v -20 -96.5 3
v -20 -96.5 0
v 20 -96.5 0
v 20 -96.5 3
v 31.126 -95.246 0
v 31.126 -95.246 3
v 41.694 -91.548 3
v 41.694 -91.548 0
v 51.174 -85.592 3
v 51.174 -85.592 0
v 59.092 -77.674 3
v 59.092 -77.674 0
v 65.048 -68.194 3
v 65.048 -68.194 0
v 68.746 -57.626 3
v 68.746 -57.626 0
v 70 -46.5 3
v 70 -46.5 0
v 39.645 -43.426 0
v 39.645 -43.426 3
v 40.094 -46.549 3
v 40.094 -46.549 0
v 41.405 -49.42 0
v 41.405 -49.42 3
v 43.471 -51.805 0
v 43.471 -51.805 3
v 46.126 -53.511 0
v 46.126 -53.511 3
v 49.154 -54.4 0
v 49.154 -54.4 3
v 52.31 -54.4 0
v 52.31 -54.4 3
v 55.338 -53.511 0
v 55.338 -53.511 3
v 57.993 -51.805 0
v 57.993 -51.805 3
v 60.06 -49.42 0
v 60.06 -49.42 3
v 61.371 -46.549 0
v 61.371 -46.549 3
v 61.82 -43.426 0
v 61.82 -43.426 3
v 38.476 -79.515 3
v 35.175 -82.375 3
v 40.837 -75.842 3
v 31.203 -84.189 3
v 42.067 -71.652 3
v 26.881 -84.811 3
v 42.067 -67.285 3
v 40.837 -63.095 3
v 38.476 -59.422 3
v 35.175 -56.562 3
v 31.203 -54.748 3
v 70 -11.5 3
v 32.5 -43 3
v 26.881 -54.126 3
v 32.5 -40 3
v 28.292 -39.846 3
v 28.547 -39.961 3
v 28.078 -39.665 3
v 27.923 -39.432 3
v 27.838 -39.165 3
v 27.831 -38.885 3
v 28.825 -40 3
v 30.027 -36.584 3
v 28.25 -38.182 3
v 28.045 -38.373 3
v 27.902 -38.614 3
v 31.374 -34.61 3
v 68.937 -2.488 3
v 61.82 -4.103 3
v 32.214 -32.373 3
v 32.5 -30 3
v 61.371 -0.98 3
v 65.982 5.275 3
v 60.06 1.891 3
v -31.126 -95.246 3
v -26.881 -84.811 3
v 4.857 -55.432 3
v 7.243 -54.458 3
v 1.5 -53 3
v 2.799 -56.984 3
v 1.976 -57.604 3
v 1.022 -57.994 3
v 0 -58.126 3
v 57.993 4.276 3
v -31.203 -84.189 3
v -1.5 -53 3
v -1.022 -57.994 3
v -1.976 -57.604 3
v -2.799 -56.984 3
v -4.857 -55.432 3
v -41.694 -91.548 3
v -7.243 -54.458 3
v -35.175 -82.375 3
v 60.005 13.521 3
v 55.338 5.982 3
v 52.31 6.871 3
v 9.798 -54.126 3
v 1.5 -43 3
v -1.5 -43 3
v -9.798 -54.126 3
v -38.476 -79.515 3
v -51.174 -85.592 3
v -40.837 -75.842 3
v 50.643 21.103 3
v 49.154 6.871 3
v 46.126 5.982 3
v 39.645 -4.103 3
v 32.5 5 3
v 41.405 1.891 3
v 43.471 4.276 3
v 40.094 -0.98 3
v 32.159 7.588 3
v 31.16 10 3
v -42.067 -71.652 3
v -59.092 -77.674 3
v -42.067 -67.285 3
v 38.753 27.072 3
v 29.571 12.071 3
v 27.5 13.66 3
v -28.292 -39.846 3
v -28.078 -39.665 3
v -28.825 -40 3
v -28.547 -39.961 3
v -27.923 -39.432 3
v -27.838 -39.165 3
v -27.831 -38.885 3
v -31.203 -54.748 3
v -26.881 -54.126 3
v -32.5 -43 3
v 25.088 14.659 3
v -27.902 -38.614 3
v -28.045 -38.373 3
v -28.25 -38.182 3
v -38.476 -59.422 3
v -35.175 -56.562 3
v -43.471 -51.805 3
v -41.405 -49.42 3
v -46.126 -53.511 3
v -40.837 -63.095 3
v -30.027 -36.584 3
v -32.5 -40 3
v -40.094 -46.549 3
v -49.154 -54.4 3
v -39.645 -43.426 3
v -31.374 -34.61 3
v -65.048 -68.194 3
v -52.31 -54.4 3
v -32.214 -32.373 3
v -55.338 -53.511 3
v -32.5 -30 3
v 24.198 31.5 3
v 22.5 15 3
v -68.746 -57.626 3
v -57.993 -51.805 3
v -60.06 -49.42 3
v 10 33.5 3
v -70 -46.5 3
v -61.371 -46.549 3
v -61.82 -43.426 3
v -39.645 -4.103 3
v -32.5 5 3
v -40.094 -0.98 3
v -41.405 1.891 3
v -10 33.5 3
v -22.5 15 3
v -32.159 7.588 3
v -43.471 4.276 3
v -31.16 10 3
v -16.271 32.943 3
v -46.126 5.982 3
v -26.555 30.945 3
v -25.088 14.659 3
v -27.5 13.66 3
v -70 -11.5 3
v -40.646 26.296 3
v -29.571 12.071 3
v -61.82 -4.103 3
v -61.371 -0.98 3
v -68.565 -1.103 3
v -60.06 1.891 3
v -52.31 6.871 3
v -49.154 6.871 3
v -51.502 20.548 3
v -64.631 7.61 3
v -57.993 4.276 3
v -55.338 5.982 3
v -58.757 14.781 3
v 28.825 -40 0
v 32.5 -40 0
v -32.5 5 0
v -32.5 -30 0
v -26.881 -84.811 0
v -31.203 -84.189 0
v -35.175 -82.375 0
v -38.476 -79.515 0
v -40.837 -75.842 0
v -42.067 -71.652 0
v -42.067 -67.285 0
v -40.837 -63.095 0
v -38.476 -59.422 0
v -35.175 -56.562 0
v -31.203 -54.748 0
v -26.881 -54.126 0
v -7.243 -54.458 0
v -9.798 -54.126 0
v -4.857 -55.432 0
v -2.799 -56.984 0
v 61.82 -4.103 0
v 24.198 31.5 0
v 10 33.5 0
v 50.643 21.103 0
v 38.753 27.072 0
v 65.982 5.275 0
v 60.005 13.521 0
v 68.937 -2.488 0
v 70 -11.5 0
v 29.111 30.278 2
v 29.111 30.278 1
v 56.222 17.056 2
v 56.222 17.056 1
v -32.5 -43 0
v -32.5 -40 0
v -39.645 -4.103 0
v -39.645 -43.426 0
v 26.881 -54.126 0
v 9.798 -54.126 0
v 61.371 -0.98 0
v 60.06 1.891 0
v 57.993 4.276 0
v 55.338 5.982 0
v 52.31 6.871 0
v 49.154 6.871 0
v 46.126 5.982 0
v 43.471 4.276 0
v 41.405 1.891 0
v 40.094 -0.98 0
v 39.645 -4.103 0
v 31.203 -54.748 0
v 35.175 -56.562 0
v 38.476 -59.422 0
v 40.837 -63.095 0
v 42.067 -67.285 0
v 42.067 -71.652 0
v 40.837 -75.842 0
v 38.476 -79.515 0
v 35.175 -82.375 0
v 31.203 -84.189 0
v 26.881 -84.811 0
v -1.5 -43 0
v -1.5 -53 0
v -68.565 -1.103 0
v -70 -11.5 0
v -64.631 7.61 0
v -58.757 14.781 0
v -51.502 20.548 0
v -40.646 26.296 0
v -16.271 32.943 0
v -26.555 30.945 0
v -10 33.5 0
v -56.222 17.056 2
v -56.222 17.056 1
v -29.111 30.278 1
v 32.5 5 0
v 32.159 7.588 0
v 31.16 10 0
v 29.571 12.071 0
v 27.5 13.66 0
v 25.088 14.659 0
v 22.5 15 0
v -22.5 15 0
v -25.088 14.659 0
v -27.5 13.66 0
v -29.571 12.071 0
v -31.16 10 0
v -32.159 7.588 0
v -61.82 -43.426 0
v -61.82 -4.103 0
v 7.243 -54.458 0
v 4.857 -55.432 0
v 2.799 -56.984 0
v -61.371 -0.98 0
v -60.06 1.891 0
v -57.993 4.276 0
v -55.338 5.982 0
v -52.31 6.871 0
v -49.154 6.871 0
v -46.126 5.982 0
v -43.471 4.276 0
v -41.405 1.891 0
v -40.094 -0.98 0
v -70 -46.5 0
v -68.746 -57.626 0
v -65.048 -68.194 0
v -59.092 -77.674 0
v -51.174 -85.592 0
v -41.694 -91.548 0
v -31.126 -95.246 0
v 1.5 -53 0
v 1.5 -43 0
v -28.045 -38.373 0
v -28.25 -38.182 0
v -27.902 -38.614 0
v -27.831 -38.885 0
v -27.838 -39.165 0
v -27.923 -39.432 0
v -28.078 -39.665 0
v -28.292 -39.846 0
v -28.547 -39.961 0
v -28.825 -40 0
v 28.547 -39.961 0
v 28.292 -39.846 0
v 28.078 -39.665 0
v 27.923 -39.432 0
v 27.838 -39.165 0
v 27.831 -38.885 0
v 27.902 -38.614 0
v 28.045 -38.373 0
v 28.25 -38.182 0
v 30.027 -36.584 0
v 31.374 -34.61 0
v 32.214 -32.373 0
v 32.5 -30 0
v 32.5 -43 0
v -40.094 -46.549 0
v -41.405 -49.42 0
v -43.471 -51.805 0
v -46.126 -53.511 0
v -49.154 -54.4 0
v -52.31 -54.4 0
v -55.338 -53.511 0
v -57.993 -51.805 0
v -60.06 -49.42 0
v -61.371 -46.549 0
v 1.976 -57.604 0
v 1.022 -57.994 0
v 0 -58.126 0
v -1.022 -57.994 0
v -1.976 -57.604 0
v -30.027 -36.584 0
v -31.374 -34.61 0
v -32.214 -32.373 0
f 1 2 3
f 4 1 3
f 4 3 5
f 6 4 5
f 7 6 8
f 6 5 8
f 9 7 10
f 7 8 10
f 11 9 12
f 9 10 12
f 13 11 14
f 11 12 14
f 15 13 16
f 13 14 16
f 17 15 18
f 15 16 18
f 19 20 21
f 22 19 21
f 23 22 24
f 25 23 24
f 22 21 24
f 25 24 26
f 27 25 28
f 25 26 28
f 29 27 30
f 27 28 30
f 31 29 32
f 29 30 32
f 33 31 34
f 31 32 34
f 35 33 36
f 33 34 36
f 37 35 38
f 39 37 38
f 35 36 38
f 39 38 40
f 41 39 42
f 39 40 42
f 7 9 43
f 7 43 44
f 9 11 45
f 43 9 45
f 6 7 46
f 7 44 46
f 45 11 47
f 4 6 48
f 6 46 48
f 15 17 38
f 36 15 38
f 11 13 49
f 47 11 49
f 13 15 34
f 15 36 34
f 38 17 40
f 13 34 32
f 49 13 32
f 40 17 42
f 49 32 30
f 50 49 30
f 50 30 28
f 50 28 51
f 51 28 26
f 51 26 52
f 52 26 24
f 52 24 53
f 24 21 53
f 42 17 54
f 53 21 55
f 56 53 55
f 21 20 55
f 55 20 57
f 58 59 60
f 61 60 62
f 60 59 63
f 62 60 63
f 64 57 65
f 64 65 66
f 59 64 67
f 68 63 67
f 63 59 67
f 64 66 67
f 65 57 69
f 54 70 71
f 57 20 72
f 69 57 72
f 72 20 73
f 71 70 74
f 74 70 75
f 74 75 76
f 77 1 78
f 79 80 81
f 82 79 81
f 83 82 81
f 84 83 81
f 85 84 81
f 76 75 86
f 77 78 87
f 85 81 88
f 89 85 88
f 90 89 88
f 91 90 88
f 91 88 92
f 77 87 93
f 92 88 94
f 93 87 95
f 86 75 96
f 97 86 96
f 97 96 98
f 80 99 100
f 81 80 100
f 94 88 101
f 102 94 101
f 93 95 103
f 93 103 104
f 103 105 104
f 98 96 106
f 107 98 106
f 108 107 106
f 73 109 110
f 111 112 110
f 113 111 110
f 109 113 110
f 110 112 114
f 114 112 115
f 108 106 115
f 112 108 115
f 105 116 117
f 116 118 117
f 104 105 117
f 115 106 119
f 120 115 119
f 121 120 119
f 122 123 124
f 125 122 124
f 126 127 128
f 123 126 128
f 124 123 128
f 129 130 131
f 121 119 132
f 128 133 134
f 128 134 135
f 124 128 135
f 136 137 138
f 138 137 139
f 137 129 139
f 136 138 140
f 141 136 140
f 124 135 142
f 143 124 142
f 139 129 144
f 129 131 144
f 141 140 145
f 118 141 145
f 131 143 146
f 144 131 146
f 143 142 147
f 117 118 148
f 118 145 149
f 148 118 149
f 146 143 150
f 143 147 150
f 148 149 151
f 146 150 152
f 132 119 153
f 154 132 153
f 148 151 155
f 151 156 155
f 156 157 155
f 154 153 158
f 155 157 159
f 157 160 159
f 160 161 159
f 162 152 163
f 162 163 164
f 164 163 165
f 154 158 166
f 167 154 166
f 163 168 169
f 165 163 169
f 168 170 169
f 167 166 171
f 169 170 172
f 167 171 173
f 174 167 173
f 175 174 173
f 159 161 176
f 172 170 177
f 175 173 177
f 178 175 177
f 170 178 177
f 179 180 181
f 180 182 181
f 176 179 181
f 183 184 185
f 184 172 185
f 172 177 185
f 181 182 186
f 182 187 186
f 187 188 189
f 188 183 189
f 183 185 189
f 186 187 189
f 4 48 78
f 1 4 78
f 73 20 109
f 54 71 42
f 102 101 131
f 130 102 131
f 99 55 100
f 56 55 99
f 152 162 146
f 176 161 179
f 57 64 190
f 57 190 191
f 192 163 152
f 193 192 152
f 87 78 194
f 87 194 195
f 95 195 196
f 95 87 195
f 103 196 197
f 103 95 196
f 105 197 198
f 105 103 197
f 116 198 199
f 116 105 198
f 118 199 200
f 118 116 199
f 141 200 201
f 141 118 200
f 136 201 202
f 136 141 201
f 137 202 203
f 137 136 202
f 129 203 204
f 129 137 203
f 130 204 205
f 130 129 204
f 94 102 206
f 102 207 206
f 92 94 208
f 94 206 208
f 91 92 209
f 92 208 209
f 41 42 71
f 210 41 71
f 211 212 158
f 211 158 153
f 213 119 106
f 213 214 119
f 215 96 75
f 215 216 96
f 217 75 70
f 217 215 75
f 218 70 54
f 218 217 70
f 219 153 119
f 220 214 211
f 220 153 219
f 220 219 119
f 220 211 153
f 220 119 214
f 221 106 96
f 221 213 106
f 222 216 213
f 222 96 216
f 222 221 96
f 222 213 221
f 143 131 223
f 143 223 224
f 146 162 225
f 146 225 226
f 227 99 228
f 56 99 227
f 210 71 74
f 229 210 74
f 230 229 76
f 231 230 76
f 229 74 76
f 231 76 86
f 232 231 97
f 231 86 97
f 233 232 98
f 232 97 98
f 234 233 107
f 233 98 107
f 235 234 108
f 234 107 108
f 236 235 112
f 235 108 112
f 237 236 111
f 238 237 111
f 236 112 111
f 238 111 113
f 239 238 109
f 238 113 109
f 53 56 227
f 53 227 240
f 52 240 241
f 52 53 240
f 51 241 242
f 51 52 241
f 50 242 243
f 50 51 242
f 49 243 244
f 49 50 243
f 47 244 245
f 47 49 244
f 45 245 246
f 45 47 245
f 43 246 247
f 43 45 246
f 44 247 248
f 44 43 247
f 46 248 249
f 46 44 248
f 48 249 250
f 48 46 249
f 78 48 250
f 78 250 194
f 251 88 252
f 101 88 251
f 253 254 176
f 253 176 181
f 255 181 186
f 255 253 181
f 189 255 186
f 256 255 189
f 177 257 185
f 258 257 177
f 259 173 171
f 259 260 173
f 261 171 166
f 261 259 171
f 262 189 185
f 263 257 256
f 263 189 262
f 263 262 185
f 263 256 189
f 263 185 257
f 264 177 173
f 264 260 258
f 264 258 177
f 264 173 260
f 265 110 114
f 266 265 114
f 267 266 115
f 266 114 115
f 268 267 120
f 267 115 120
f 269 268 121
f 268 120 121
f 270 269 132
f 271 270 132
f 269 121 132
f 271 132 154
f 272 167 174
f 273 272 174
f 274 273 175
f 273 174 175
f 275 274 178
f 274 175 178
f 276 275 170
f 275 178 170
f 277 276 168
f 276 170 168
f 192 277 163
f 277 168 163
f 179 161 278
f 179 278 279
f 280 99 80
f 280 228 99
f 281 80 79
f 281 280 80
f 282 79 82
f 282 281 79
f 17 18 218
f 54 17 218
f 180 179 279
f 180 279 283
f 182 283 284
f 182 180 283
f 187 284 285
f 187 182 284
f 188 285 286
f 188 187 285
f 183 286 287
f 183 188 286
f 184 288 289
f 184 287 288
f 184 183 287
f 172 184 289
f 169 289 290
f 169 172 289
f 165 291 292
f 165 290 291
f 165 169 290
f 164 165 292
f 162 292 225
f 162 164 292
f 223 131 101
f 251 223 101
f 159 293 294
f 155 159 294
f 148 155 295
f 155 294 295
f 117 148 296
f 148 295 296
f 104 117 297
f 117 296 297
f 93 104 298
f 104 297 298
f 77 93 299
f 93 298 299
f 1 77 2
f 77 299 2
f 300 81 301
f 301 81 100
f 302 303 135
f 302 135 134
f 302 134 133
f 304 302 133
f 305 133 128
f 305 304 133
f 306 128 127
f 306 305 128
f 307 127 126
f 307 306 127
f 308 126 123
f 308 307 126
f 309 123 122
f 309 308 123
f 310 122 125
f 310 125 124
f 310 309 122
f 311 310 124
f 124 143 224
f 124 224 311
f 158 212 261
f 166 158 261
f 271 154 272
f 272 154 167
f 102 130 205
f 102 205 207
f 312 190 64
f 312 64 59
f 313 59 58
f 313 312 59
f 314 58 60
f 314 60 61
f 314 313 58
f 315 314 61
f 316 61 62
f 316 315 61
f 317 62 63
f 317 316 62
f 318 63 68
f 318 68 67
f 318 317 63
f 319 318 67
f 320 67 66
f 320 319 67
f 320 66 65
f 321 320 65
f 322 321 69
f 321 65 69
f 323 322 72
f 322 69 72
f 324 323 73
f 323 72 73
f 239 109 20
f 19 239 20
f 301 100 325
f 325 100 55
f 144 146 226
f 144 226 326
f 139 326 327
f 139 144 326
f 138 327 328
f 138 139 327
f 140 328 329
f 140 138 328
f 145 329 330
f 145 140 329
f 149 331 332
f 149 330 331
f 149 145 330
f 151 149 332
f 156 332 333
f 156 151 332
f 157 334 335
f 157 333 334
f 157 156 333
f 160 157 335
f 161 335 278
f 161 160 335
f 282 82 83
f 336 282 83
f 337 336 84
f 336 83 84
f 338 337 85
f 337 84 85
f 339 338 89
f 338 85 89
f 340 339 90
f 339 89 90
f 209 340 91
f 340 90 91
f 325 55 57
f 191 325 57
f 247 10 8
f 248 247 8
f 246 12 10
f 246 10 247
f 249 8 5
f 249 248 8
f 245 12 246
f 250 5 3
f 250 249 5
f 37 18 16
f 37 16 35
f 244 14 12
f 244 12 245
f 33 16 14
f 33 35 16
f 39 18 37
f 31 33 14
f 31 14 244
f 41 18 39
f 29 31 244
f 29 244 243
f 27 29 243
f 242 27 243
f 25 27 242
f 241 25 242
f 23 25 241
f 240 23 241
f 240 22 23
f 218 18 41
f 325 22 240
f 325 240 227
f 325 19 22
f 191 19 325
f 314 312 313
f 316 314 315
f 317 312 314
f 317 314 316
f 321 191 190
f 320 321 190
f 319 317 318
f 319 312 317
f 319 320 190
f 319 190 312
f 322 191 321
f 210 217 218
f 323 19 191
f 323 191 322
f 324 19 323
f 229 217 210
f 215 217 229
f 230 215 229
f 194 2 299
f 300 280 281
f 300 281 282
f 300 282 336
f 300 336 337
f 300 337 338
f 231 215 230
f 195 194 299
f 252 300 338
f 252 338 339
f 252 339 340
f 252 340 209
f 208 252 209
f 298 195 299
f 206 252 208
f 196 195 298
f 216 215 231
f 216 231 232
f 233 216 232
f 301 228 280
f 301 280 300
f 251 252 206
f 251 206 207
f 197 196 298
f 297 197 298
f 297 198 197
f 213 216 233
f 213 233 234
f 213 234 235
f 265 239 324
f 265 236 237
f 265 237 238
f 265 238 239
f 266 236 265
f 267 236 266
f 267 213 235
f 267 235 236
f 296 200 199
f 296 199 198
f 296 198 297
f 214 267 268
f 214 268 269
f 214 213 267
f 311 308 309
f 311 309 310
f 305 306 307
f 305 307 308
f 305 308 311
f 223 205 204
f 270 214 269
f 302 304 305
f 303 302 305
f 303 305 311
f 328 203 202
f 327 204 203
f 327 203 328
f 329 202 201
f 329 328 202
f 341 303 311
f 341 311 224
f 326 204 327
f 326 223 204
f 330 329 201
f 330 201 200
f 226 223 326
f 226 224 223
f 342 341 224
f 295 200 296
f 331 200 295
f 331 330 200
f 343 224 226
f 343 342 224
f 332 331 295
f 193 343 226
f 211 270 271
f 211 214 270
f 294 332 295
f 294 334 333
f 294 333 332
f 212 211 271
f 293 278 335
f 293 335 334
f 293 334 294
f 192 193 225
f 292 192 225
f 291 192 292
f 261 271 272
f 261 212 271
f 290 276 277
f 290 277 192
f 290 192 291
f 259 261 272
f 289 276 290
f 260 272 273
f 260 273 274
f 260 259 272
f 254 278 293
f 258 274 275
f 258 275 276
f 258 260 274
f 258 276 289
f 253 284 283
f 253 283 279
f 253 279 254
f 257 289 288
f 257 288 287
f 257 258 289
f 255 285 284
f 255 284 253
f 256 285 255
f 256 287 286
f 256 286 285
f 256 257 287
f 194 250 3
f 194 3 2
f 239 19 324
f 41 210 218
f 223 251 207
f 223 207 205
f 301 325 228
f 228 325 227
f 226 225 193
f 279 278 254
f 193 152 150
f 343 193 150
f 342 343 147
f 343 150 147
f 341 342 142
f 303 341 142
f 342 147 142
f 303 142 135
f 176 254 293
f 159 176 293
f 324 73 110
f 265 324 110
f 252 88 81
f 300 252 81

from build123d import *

# Parameters (mm, degrees)
BOSS_EXTRUDE1_DEPTH = 3
CUT_EXTRUDE1_DEPTH  = 10
SKETCH3_W           = 65
SKETCH3_H           = 3
CUT_EXTRUDE2_DEPTH  = 10
FILLET1_START       = -1
FILLET1_DEPTH       = 5
SKETCH4_W           = 3
SKETCH4_H           = 10
CUT_EXTRUDE3_DEPTH  = 10
BOSS_EXTRUDE2_DEPTH = 3
FILLET2_R           = 10


with BuildPart() as part:
    # Sketch1 → Boss-Extrude1 (new body)
    with BuildSketch(Plane.XY):
        with BuildLine():
            add(Edge.make_bspline(
                [(-70, -11.5), (-70, 26.5), (-18, 33.5), (-10, 33.5)],
                knots=[0, 0, 0, 0, 1, 1, 1, 1], degree=3))
            Line((-70, -11.5), (-70, -46.5))
            ThreePointArc((-70, -46.5), (-55.355339059, -81.855339059), (-20, -96.5))
            Line((-20, -96.5), (20, -96.5))
            ThreePointArc((20, -96.5), (55.355339059, -81.855339059), (70, -46.5))
            Line((70, -46.5), (70, -11.5))
            add(Edge.make_bspline(
                [(10, 33.5), (18, 33.5), (70, 26.5), (70, -11.5)],
                knots=[0, 0, 0, 0, 1, 1, 1, 1], degree=3))
            Line((10, 33.5), (-10, 33.5))
        make_face()
    extrude(amount=BOSS_EXTRUDE1_DEPTH)

    # Sketch2 → Cut-Extrude1 (cut)
    with BuildSketch(Plane.XY.offset(3)):
        with BuildLine():
            Line((-22.5, -40), (22.5, -40))
            ThreePointArc((22.5, -40), (29.571067812, -37.071067812), (32.5, -30))
            Line((32.5, -30), (32.5, 5))
            ThreePointArc((32.5, 5), (29.571067812, 12.071067812), (22.5, 15))
            Line((22.5, 15), (-22.5, 15))
            ThreePointArc((-22.5, 15), (-29.571067812, 12.071067812), (-32.5, 5))
            Line((-32.5, 5), (-32.5, -30))
            ThreePointArc((-32.5, -30), (-29.571067812, -37.071067812), (-22.5, -40))
        make_face()
    extrude(amount=-CUT_EXTRUDE1_DEPTH, mode=Mode.SUBTRACT)

    # Sketch3 → Cut-Extrude2 (cut)
    with BuildSketch(Plane.XY.offset(3)):
        with Locations((0, -41.5)):
            Rectangle(SKETCH3_W, SKETCH3_H)
        with BuildLine():
            Line((-26.880912438, -54.126379534), (26.880912438, -54.126379534))
            ThreePointArc((26.880912438, -54.126379534), (42.22301594, -69.468483036), (26.880912438, -84.810586538))
            Line((26.880912438, -84.810586538), (-26.880912438, -84.810586538))
            ThreePointArc((-26.880912438, -84.810586538), (-42.22301594, -69.468483036), (-26.880912438, -54.126379534))
        make_face()
        with BuildLine():
            Line((-39.64451115, -4.103386604), (-39.64451115, -43.425584655))
            ThreePointArc((-39.64451115, -43.425584655), (-50.732081748, -54.513155253), (-61.819652346, -43.425584655))
            Line((-61.819652346, -43.425584655), (-61.819652346, -4.103386604))
            ThreePointArc((-61.819652346, -4.103386604), (-50.732081748, 6.984183994), (-39.64451115, -4.103386604))
        make_face()
        with BuildLine():
            Line((39.64451115, -4.103386604), (39.64451115, -43.425584655))
            ThreePointArc((39.64451115, -43.425584655), (50.732081748, -54.513155253), (61.819652346, -43.425584655))
            Line((61.819652346, -43.425584655), (61.819652346, -4.103386604))
            ThreePointArc((61.819652346, -4.103386604), (50.732081748, 6.984183994), (39.64451115, -4.103386604))
        make_face()
    extrude(amount=-CUT_EXTRUDE2_DEPTH, mode=Mode.SUBTRACT)

    # Fillet1: read off the stored shape, not the designer's step
    # Fillet1 outline → Fillet1 (cut)
    with BuildSketch(Plane.XY.offset(FILLET1_START)):
        with BuildLine():
            ThreePointArc((28.82455532, -40), (27.871092731, -39.301511345), (28.249595746, -38.181818182))
            ThreePointArc((28.249595746, -38.181818182), (25.515113446, -39.534625893), (22.5, -40))
            Line((22.5, -40), (28.82455532, -40))
        make_face()
        with BuildLine():
            ThreePointArc((-28.249595746, -38.181818182), (-27.871092731, -39.301511345), (-28.82455532, -40))
            Line((-28.82455532, -40), (-22.5, -40))
            ThreePointArc((-22.5, -40), (-25.515113446, -39.534625893), (-28.249595746, -38.181818182))
        make_face()
    extrude(amount=FILLET1_DEPTH, mode=Mode.SUBTRACT)

    # Sketch4 → Cut-Extrude3 (cut)
    with BuildSketch(Plane.XY.offset(3)):
        with Locations((0, -48)):
            Rectangle(SKETCH4_W, SKETCH4_H)
    extrude(amount=-CUT_EXTRUDE3_DEPTH, mode=Mode.SUBTRACT)

    # Sketch5 → Boss-Extrude2 (add)
    with BuildSketch(Plane.XY.offset(3)):
        with BuildLine():
            Line((-4, -54.126379534), (4, -54.126379534))
            ThreePointArc((4, -54.126379534), (0, -58.126379534), (-4, -54.126379534))
        make_face()
    extrude(amount=-BOSS_EXTRUDE2_DEPTH)

    # Fillet2
    fillet2_edges = [part.edges().sort_by_distance(p)[0] for p in [
        (4, -54.126379534, 1.5),
        (-4, -54.126379534, 1.5),
    ]]
    fillet(fillet2_edges, radius=FILLET2_R)


solid = part.part
